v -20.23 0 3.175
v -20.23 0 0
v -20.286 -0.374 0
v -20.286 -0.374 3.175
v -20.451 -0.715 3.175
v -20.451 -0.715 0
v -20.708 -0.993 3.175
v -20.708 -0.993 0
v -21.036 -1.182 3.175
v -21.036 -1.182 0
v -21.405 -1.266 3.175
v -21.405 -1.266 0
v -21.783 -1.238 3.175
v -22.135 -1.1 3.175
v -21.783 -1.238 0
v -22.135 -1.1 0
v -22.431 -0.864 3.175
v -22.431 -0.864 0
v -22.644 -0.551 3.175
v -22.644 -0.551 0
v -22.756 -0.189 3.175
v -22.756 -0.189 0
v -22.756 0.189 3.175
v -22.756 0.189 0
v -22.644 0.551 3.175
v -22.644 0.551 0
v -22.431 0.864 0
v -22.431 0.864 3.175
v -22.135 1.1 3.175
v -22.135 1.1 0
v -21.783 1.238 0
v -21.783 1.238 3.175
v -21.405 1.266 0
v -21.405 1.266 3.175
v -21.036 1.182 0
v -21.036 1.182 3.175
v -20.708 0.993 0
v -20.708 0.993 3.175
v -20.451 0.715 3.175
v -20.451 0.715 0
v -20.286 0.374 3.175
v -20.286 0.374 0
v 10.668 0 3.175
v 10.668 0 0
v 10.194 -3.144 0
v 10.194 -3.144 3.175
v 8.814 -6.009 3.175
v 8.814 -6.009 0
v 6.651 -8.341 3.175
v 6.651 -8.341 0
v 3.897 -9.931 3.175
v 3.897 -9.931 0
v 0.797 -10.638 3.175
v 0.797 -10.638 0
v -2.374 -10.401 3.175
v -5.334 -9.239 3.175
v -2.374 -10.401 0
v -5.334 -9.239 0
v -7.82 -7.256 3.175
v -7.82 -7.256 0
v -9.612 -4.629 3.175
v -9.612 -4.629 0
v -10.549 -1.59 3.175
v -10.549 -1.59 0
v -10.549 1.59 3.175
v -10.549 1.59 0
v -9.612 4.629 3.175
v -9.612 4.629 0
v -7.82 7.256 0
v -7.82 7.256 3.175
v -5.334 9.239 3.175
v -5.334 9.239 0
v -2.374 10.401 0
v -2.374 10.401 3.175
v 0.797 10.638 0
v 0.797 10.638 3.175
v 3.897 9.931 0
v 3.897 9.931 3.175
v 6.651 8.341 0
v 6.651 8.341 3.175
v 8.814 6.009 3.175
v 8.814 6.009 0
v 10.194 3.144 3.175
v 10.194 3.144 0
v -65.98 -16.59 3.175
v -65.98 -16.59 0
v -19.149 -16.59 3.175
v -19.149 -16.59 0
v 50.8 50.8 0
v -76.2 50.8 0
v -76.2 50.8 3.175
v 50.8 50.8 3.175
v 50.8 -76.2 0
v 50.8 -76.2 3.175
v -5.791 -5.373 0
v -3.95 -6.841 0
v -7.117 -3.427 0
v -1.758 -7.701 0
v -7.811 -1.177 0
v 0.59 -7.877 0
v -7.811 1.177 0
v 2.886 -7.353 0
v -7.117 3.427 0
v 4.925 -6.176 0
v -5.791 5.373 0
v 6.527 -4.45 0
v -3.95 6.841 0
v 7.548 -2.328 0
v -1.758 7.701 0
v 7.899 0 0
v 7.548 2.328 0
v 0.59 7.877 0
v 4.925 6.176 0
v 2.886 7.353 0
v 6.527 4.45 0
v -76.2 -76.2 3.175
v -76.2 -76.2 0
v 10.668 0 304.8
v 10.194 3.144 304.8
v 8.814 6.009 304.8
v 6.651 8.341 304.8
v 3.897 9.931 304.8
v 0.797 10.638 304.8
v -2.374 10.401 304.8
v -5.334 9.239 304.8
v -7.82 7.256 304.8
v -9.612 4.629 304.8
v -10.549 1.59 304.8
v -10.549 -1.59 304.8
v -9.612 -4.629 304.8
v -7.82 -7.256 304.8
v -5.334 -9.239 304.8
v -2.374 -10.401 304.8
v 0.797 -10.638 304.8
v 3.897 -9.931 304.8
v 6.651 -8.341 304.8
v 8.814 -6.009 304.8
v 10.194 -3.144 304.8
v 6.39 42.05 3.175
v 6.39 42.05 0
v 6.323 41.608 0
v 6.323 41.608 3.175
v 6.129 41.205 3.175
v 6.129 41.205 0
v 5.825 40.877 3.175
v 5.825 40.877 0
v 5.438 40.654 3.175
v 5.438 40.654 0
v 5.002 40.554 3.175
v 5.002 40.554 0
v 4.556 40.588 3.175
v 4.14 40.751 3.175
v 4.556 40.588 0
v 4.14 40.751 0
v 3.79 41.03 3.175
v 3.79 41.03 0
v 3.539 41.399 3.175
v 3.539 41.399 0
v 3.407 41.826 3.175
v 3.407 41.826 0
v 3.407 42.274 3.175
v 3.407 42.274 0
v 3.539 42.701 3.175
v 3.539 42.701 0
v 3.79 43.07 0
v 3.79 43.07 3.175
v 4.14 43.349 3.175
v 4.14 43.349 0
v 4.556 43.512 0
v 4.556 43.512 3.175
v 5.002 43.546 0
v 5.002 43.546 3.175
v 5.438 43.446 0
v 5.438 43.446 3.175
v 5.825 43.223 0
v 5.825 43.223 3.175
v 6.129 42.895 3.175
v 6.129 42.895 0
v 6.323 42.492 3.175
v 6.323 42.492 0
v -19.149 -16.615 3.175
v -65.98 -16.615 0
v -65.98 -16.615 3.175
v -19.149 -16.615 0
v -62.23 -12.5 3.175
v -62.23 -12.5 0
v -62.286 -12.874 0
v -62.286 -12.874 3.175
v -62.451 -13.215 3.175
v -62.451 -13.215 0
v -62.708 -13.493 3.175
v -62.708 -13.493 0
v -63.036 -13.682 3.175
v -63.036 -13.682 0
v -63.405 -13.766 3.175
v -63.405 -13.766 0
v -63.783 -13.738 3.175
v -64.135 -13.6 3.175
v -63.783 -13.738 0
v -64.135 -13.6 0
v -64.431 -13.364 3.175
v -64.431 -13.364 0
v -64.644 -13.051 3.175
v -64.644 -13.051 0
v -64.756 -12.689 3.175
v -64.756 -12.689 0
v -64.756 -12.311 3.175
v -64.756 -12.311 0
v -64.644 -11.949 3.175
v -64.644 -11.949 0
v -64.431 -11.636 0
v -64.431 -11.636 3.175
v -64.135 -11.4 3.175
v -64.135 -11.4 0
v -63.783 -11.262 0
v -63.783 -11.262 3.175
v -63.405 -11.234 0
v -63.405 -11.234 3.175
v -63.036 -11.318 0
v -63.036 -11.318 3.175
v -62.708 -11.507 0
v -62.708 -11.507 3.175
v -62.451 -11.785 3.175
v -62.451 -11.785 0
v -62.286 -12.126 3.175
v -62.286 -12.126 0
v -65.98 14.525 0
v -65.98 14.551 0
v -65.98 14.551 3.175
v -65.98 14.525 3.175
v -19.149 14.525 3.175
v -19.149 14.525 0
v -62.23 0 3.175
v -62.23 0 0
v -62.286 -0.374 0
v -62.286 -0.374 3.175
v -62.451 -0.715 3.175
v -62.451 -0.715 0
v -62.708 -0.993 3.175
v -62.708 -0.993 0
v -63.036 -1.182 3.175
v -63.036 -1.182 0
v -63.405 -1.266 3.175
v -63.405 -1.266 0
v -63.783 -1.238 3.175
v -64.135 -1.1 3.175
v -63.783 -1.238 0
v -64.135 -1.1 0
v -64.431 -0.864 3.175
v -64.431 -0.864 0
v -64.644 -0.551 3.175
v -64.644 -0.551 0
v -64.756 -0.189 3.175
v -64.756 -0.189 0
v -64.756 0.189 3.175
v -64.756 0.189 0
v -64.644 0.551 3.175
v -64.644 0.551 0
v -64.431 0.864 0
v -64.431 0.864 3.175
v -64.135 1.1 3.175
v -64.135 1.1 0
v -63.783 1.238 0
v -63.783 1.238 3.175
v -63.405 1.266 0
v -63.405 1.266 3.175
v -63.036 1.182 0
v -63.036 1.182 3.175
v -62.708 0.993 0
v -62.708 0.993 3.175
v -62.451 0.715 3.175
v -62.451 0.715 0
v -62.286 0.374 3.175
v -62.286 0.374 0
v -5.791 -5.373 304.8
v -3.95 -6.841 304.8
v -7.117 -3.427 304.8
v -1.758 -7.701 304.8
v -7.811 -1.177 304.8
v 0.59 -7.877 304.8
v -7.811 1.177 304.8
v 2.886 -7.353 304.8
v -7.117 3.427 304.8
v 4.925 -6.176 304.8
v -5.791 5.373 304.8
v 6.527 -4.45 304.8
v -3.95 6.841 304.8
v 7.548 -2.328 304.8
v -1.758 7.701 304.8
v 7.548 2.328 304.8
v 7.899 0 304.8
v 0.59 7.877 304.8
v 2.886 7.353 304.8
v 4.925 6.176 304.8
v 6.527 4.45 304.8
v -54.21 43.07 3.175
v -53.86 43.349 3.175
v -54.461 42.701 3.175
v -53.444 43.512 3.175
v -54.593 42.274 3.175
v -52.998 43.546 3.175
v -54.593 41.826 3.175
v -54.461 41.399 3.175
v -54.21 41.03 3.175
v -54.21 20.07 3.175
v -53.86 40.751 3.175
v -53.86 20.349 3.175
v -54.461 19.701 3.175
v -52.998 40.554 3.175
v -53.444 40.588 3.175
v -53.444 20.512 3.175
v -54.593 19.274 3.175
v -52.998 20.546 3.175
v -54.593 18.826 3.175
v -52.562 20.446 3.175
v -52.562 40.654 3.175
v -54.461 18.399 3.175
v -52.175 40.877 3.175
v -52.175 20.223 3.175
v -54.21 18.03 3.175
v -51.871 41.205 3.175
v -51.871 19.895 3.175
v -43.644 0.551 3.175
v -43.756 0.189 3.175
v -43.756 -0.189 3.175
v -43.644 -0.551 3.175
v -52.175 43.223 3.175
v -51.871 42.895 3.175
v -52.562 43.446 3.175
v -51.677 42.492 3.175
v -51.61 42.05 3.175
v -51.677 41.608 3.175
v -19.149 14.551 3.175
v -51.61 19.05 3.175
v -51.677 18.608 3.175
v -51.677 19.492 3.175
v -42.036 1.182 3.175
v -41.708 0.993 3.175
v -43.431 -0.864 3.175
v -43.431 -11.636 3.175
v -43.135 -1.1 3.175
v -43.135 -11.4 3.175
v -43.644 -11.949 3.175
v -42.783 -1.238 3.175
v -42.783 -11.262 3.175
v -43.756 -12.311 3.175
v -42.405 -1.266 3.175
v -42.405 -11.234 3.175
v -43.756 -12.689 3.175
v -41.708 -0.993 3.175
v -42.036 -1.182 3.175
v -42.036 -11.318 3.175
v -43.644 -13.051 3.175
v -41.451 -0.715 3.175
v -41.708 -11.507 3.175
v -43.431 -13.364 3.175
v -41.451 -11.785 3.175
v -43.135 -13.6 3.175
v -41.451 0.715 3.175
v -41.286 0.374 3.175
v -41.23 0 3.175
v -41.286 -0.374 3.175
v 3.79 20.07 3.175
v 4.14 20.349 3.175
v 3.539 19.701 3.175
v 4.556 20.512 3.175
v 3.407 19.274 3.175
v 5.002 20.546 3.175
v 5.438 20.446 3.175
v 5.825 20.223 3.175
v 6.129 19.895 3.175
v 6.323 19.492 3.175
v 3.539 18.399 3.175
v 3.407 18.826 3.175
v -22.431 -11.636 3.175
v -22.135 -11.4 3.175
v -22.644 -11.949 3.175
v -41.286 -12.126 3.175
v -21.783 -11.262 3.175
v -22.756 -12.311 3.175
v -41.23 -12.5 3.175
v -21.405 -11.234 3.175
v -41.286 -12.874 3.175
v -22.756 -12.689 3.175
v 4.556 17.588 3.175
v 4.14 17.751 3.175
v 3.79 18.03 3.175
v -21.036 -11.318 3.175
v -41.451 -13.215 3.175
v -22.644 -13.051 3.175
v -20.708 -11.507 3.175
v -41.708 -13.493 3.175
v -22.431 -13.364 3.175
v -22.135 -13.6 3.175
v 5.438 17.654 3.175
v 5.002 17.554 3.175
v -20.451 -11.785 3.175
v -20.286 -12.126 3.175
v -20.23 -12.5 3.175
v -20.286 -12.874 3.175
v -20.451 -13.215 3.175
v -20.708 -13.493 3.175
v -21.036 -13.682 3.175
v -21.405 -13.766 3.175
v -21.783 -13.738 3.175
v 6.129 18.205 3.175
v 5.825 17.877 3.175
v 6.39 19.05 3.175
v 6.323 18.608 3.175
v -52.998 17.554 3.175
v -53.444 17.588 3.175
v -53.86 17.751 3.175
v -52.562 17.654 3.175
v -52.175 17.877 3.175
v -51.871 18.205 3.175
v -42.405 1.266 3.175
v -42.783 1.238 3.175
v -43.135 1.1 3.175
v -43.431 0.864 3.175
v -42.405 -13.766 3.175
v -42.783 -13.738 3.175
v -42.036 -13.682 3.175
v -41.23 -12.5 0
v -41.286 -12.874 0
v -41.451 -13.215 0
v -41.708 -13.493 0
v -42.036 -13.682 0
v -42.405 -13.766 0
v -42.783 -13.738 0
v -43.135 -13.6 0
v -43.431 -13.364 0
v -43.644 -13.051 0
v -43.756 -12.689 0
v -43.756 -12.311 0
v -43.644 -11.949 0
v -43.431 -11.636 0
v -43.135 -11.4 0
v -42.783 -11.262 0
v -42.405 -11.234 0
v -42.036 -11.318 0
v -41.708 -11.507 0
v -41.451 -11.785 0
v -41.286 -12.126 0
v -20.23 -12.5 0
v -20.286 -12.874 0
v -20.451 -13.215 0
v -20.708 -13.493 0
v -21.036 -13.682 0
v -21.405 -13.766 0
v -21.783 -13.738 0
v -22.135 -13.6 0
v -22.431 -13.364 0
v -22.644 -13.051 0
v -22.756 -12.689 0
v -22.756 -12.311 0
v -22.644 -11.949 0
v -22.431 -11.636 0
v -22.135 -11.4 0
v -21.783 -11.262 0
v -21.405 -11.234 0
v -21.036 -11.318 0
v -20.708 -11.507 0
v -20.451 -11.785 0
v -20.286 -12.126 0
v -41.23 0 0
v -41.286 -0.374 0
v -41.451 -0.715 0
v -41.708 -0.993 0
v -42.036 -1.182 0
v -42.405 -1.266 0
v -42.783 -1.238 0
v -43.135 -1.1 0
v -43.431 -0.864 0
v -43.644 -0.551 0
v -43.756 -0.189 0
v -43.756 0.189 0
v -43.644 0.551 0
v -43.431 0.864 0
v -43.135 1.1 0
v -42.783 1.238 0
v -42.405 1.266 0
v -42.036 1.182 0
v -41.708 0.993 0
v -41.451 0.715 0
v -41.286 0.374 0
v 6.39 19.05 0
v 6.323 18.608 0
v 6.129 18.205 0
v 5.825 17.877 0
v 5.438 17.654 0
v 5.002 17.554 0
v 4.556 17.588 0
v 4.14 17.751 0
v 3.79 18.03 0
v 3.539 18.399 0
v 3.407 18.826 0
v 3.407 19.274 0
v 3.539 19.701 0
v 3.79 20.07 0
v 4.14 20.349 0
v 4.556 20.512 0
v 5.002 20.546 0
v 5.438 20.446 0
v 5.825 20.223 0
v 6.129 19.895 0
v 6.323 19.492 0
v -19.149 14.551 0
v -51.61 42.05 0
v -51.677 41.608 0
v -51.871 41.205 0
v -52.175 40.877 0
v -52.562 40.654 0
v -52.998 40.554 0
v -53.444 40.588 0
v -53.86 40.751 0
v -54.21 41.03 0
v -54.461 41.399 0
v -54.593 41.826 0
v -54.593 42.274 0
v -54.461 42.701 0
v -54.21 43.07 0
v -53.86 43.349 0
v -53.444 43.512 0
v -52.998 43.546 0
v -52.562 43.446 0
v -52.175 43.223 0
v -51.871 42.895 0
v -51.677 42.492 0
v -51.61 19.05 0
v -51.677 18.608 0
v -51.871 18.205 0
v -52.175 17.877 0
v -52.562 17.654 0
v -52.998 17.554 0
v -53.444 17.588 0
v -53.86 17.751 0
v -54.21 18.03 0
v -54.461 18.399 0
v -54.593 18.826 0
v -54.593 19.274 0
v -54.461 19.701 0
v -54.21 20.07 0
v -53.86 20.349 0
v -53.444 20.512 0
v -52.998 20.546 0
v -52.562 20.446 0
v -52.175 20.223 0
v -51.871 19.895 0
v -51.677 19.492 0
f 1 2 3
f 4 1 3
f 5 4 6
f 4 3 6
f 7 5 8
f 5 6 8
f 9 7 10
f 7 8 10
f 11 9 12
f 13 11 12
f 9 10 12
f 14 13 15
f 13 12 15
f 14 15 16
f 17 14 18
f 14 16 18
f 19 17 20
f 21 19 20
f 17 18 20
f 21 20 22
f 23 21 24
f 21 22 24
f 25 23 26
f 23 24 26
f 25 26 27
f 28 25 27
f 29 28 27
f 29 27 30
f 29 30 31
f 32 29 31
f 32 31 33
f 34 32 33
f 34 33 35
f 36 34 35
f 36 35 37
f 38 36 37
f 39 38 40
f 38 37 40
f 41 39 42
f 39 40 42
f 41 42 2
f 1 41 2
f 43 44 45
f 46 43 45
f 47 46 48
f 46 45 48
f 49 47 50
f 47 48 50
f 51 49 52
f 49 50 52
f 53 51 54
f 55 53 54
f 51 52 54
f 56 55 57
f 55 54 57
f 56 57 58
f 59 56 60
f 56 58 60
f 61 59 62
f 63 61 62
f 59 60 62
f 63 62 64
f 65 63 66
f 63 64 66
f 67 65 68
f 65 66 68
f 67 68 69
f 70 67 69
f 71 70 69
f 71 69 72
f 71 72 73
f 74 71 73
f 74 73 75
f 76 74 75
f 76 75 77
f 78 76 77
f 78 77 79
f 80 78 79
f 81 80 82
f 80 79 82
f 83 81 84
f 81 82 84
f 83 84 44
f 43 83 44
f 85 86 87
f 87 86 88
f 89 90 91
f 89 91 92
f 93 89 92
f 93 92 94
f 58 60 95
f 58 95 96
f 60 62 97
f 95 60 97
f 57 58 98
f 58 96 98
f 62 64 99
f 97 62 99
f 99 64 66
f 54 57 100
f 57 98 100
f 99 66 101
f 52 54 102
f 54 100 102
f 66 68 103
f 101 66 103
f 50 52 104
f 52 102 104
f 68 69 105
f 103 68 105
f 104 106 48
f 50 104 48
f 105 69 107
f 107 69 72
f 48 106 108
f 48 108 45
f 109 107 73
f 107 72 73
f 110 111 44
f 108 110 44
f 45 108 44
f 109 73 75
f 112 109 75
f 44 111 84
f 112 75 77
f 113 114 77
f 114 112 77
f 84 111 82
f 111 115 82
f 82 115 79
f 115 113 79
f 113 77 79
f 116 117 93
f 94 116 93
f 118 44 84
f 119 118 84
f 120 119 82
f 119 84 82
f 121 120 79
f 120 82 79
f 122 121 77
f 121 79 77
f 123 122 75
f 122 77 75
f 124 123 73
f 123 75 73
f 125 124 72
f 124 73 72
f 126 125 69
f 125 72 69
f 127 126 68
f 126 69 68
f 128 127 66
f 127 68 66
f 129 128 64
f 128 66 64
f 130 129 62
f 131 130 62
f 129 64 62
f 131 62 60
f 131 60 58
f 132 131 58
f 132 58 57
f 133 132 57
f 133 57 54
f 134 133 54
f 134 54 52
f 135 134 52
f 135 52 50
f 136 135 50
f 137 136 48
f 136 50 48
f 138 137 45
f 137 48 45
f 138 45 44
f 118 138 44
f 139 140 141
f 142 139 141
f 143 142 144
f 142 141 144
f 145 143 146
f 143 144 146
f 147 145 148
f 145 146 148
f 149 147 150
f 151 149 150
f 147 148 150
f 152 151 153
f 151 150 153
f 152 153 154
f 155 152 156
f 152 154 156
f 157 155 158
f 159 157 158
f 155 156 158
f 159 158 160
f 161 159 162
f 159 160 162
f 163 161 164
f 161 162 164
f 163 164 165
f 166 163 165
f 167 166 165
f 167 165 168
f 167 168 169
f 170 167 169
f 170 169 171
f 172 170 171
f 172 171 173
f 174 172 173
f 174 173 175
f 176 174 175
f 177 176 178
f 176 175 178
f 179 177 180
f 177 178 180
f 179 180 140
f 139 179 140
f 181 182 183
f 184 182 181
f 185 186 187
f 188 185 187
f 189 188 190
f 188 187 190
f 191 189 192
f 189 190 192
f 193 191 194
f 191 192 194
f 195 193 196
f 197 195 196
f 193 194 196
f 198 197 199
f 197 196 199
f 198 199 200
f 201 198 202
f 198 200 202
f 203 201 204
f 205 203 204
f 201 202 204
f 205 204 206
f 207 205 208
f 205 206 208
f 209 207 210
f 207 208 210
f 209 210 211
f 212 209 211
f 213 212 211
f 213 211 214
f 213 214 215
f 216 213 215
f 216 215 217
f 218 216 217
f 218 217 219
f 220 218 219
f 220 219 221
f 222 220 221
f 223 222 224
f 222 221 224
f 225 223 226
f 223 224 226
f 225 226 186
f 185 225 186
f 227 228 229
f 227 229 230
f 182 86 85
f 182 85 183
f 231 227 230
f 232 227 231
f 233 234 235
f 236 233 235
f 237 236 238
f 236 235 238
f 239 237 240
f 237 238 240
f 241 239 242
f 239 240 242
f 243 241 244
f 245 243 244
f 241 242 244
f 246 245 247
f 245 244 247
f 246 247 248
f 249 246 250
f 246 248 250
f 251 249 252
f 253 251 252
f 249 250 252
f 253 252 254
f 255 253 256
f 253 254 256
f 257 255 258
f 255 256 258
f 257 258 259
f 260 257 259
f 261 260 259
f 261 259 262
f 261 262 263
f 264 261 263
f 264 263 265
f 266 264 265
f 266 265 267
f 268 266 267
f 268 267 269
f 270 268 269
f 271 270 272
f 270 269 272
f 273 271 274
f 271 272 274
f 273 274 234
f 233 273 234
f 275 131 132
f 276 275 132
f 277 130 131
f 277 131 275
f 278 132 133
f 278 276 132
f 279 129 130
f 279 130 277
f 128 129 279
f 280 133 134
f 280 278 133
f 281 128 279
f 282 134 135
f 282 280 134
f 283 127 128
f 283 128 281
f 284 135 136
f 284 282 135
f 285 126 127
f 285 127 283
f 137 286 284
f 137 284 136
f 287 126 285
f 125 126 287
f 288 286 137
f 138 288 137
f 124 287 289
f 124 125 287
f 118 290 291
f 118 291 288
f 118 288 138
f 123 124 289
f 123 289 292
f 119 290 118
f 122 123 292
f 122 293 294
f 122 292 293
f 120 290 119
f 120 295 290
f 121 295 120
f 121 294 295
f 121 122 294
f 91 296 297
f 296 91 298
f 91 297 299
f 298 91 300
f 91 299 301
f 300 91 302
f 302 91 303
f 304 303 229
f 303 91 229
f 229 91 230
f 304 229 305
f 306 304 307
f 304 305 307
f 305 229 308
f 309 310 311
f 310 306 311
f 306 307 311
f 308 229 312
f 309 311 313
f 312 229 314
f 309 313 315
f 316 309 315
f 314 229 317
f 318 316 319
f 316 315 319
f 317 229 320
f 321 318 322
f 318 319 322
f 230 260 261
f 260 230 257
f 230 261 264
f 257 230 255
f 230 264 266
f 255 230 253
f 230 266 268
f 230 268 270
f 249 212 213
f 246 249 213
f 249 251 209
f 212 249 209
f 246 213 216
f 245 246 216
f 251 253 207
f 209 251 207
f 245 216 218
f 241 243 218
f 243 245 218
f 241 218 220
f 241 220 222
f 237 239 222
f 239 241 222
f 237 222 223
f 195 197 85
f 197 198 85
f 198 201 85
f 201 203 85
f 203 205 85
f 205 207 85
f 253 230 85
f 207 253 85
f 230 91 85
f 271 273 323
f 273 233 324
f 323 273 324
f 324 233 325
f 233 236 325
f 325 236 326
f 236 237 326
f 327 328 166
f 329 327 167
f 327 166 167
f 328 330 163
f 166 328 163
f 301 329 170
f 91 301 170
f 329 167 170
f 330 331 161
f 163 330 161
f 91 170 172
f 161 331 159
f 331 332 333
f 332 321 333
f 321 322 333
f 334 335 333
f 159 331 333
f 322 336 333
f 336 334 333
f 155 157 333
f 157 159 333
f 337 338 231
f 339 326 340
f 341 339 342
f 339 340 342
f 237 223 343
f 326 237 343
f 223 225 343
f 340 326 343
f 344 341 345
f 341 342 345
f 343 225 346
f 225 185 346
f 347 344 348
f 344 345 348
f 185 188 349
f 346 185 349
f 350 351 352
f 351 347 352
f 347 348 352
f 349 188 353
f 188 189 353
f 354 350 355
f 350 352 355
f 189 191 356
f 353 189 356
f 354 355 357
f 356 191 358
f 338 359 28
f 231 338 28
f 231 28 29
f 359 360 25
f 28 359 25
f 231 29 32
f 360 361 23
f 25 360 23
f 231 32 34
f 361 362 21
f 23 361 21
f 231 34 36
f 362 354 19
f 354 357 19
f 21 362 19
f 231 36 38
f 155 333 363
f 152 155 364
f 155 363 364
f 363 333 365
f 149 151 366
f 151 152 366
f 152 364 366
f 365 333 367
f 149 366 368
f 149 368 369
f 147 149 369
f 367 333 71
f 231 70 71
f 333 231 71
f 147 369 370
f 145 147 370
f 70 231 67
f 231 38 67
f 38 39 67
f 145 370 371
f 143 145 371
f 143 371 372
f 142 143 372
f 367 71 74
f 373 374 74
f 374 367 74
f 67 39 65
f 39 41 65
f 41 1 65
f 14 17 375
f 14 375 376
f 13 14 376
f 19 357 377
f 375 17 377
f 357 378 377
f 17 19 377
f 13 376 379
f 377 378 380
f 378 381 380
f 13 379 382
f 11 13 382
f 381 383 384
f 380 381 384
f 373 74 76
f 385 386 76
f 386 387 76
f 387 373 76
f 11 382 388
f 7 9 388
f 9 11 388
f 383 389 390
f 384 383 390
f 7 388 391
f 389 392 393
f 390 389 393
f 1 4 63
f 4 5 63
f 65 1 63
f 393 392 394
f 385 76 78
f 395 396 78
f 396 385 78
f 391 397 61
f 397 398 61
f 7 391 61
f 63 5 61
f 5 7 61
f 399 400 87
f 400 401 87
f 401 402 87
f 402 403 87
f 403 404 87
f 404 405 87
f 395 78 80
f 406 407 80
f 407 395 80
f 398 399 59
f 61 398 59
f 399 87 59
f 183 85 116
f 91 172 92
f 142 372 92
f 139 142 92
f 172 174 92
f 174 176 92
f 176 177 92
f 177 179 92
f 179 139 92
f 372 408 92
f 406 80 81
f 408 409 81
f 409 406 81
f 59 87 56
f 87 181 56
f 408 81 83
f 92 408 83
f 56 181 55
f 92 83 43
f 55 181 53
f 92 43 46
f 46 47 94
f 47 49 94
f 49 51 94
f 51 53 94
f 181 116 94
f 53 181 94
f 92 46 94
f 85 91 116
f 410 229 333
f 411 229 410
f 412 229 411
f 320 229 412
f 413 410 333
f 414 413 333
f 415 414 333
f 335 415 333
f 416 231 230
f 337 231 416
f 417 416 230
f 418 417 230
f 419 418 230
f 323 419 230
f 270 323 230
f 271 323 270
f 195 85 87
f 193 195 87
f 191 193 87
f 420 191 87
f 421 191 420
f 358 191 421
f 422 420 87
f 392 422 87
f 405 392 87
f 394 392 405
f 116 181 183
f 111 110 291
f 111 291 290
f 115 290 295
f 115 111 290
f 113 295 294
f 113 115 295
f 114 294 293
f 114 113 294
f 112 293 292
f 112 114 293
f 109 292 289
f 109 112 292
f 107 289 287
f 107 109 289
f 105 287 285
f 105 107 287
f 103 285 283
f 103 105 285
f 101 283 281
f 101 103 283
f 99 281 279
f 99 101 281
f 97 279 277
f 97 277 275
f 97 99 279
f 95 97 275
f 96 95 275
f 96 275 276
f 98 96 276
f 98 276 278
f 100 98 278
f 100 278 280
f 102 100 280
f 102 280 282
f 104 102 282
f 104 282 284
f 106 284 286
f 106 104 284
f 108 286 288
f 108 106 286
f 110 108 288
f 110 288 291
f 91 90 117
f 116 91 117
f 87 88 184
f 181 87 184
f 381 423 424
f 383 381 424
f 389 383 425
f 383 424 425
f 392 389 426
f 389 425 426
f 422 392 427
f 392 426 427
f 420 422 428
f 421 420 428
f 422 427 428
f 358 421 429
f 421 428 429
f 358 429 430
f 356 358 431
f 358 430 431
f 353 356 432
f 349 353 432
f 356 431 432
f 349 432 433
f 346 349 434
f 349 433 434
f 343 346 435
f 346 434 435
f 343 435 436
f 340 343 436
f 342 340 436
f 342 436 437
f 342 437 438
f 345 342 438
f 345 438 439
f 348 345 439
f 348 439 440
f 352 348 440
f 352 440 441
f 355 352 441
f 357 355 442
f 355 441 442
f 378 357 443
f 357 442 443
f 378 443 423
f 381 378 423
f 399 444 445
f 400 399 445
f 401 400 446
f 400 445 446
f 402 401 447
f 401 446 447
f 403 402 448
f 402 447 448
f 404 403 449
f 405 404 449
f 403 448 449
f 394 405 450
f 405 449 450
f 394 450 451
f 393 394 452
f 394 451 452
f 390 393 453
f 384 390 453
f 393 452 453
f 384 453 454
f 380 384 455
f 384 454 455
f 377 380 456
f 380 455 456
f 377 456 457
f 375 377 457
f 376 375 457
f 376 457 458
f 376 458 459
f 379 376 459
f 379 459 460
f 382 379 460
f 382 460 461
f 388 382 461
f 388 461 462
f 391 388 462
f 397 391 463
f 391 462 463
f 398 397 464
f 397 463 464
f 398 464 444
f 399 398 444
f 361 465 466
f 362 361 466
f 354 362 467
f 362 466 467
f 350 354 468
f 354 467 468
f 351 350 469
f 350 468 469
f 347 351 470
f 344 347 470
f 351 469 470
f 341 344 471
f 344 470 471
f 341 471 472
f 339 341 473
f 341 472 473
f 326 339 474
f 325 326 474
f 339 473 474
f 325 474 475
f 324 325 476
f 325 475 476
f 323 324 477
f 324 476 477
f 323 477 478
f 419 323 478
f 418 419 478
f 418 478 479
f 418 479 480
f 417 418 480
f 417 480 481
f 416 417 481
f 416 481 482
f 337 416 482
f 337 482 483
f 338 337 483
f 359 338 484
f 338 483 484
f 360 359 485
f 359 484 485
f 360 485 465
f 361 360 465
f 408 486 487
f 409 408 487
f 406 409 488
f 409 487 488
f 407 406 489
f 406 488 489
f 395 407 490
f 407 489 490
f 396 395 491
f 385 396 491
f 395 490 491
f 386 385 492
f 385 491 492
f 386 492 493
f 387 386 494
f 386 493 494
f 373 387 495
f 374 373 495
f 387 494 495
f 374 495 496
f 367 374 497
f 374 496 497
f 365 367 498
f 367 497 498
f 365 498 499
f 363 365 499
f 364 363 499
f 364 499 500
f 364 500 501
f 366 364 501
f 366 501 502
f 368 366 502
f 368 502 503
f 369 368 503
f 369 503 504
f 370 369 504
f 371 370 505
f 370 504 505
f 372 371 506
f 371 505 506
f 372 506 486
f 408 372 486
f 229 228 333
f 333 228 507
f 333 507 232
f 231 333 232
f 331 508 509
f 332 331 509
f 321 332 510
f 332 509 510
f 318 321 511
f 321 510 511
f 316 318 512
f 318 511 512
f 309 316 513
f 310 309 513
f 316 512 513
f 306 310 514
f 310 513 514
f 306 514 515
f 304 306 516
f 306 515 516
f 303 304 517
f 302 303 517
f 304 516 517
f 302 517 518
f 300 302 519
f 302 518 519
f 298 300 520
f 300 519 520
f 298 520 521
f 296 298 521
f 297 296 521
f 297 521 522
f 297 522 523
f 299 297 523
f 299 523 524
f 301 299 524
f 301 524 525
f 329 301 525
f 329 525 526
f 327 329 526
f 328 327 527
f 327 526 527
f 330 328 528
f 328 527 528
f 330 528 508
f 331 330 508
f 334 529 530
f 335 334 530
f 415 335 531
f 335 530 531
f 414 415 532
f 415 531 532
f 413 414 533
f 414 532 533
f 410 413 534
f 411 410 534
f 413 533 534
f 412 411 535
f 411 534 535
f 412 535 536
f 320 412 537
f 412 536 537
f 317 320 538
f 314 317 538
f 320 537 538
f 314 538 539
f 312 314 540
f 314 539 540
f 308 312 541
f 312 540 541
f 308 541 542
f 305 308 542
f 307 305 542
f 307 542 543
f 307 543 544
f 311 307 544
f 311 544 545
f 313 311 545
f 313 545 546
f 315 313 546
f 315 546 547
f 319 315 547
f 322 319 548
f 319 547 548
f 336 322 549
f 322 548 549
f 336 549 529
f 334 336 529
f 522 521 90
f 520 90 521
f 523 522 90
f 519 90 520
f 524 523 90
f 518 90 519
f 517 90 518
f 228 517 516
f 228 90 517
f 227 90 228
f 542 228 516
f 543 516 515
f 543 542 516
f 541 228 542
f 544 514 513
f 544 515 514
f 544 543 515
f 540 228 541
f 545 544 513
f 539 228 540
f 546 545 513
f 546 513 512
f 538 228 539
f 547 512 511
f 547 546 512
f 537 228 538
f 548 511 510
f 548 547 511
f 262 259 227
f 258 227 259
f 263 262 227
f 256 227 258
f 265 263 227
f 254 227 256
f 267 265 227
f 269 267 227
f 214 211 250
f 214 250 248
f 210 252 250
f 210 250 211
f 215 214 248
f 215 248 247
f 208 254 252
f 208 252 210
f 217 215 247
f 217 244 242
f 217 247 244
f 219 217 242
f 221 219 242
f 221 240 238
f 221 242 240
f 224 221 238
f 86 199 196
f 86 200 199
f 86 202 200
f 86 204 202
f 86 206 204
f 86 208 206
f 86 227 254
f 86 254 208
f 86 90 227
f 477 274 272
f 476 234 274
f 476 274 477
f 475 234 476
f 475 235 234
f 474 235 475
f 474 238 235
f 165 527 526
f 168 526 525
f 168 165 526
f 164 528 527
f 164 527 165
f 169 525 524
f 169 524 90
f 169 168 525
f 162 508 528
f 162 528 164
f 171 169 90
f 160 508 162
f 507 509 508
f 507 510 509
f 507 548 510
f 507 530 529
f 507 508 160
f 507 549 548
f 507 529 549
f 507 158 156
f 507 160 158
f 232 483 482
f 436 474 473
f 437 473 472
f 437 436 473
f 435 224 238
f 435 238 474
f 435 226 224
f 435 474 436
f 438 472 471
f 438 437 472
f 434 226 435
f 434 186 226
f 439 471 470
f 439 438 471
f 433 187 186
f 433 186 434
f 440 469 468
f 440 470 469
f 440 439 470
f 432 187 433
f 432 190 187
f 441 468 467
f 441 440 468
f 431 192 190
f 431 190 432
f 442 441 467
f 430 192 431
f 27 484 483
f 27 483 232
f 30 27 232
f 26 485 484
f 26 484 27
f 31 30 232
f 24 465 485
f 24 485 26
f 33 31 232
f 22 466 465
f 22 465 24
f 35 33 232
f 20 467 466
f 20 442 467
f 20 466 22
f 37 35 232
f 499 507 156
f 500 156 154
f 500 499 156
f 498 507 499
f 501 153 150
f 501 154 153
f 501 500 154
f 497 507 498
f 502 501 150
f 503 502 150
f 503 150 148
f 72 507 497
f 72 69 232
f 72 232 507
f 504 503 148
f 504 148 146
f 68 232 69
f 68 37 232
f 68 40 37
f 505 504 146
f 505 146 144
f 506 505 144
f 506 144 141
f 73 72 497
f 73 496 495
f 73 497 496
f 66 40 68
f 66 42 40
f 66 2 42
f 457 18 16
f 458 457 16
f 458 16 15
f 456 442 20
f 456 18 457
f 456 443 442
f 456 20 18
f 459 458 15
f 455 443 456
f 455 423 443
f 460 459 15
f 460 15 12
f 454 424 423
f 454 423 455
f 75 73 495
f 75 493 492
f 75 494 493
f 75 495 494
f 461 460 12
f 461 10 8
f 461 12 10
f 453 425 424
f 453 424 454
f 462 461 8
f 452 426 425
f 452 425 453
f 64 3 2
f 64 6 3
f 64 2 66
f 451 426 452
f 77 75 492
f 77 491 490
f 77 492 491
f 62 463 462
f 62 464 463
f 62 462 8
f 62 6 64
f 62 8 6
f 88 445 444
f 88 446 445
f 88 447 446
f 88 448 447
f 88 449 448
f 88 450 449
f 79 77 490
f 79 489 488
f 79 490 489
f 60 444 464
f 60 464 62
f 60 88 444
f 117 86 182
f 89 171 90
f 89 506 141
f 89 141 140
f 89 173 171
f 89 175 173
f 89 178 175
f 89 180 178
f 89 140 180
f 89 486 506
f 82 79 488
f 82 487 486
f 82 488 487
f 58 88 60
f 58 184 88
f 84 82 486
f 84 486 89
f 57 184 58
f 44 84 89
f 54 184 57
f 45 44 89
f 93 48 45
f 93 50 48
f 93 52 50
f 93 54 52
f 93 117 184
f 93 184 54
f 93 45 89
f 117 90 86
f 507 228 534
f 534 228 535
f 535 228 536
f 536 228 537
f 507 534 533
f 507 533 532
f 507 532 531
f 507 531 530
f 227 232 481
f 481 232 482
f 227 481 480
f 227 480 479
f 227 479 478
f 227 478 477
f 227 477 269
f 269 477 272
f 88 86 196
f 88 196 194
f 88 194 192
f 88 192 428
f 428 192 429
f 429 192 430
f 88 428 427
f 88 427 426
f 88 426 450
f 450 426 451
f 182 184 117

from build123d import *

# Parameters (mm, degrees)
F0_R     = 10.668
F0_R_2   = 7.8994
F1_DEPTH = 304.8
F2_W     = 127
F2_H     = 127
F2_R     = 10.668
F3_DEPTH = 3.175
F4_R     = 1.27
F4_W     = 46.830496
F4_H     = 0.0254
F5_DEPTH = 3.175
F6_R     = 1.5
F7_DEPTH = 3.175


with BuildPart() as f1:
    # F0 (on Top) → F1 (new body)
    with BuildSketch(Plane.XY):
        Circle(F0_R)
        Circle(F0_R_2, mode=Mode.SUBTRACT)
    extrude(amount=F1_DEPTH)


with BuildPart() as f3:
    # F2 (on face) → F3 (new body)
    with BuildSketch(Plane(origin=(0, 0, 0), x_dir=(1, 0, 0), z_dir=(0, 0, -1))):
        with Locations((-12.7, 12.7)):
            Rectangle(F2_W, F2_H)
        Circle(F2_R, mode=Mode.SUBTRACT)
    extrude(amount=-F3_DEPTH)

    # F4 (on face) → F5 (cut, through all)
    with BuildSketch(Plane(origin=(0, 0, 0), x_dir=(1, 0, 0), z_dir=(0, 0, -1))):
        with Locations((-63.5, 0)):
            Circle(F4_R)
        with Locations((-63.5, 12.5)):
            Circle(F4_R)
        with Locations((-42.5, 0)):
            Circle(F4_R)
        with Locations((-42.5, 12.5)):
            Circle(F4_R)
        with Locations((-21.5, 0)):
            Circle(F4_R)
        with Locations((-21.5, 12.5)):
            Circle(F4_R)
        with Locations((-42.564561, 16.602451)):
            Rectangle(F4_W, F4_H)
        with Locations((-42.564561, -14.537949)):
            Rectangle(F4_W, F4_H)
    extrude(amount=-F5_DEPTH, mode=Mode.SUBTRACT)

    # F6 (on face) → F7 (cut, through all)
    with BuildSketch(Plane(origin=(0, 0, 0), x_dir=(1, 0, 0), z_dir=(0, 0, -1))):
        with Locations((-53.11, -19.05)):
            Circle(F6_R)
        with Locations((-53.11, -42.05)):
            Circle(F6_R)
        with Locations((4.89, -19.05)):
            Circle(F6_R)
        with Locations((4.89, -42.05)):
            Circle(F6_R)
    extrude(amount=-F7_DEPTH, mode=Mode.SUBTRACT)


solid = Compound([f1.part, f3.part])
